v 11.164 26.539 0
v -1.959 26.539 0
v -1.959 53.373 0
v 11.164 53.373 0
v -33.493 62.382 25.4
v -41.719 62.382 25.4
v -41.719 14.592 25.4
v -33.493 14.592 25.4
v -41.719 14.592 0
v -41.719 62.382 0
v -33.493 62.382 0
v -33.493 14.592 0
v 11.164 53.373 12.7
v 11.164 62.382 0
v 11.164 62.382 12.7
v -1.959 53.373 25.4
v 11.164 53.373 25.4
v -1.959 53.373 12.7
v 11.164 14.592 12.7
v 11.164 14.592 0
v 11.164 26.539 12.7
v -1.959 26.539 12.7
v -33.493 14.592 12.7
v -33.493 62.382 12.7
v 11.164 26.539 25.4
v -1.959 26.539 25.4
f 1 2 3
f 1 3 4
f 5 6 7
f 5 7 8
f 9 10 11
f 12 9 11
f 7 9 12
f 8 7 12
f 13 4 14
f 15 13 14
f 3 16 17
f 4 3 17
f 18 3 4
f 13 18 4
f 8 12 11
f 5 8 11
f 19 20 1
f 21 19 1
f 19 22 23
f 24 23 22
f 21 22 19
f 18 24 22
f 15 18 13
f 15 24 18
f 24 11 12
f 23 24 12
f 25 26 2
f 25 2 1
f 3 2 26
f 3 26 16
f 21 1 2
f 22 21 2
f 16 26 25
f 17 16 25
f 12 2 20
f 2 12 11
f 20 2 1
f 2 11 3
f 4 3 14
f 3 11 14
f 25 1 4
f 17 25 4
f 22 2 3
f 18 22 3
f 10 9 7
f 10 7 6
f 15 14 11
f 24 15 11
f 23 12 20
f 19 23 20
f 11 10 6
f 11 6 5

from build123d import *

# Parameters (mm, degrees)
F0_W     = 8.226242
F0_H     = 47.79055
F0_W_2   = 13.122815
F0_H_2   = 26.833224
F1_DEPTH = 25.4
F2_DEPTH = 12.7


with BuildPart() as f1:
    # F0 (on Top) → F1 (new body)
    with BuildSketch(Plane.XY):
        with Locations((-37.605679, 38.487062)):
            Rectangle(F0_W, F0_H)
        with Locations((4.602778, 39.956036)):
            Rectangle(F0_W_2, F0_H_2)
    extrude(amount=F1_DEPTH)


with BuildPart() as f2:
    # F0 (on Top) → F2 (new body)
    with BuildSketch(Plane.XY):
        Polygon((11.164186, 62.382337), (-33.492558, 62.382337), (-33.492558, 14.591787), (11.164186, 14.591787), (11.164186, 26.539424), (-1.958629, 26.539424), (-1.958629, 53.372648), (11.164186, 53.372648), align=None)
    extrude(amount=F2_DEPTH)


solid = Compound([f1.part, f2.part])
